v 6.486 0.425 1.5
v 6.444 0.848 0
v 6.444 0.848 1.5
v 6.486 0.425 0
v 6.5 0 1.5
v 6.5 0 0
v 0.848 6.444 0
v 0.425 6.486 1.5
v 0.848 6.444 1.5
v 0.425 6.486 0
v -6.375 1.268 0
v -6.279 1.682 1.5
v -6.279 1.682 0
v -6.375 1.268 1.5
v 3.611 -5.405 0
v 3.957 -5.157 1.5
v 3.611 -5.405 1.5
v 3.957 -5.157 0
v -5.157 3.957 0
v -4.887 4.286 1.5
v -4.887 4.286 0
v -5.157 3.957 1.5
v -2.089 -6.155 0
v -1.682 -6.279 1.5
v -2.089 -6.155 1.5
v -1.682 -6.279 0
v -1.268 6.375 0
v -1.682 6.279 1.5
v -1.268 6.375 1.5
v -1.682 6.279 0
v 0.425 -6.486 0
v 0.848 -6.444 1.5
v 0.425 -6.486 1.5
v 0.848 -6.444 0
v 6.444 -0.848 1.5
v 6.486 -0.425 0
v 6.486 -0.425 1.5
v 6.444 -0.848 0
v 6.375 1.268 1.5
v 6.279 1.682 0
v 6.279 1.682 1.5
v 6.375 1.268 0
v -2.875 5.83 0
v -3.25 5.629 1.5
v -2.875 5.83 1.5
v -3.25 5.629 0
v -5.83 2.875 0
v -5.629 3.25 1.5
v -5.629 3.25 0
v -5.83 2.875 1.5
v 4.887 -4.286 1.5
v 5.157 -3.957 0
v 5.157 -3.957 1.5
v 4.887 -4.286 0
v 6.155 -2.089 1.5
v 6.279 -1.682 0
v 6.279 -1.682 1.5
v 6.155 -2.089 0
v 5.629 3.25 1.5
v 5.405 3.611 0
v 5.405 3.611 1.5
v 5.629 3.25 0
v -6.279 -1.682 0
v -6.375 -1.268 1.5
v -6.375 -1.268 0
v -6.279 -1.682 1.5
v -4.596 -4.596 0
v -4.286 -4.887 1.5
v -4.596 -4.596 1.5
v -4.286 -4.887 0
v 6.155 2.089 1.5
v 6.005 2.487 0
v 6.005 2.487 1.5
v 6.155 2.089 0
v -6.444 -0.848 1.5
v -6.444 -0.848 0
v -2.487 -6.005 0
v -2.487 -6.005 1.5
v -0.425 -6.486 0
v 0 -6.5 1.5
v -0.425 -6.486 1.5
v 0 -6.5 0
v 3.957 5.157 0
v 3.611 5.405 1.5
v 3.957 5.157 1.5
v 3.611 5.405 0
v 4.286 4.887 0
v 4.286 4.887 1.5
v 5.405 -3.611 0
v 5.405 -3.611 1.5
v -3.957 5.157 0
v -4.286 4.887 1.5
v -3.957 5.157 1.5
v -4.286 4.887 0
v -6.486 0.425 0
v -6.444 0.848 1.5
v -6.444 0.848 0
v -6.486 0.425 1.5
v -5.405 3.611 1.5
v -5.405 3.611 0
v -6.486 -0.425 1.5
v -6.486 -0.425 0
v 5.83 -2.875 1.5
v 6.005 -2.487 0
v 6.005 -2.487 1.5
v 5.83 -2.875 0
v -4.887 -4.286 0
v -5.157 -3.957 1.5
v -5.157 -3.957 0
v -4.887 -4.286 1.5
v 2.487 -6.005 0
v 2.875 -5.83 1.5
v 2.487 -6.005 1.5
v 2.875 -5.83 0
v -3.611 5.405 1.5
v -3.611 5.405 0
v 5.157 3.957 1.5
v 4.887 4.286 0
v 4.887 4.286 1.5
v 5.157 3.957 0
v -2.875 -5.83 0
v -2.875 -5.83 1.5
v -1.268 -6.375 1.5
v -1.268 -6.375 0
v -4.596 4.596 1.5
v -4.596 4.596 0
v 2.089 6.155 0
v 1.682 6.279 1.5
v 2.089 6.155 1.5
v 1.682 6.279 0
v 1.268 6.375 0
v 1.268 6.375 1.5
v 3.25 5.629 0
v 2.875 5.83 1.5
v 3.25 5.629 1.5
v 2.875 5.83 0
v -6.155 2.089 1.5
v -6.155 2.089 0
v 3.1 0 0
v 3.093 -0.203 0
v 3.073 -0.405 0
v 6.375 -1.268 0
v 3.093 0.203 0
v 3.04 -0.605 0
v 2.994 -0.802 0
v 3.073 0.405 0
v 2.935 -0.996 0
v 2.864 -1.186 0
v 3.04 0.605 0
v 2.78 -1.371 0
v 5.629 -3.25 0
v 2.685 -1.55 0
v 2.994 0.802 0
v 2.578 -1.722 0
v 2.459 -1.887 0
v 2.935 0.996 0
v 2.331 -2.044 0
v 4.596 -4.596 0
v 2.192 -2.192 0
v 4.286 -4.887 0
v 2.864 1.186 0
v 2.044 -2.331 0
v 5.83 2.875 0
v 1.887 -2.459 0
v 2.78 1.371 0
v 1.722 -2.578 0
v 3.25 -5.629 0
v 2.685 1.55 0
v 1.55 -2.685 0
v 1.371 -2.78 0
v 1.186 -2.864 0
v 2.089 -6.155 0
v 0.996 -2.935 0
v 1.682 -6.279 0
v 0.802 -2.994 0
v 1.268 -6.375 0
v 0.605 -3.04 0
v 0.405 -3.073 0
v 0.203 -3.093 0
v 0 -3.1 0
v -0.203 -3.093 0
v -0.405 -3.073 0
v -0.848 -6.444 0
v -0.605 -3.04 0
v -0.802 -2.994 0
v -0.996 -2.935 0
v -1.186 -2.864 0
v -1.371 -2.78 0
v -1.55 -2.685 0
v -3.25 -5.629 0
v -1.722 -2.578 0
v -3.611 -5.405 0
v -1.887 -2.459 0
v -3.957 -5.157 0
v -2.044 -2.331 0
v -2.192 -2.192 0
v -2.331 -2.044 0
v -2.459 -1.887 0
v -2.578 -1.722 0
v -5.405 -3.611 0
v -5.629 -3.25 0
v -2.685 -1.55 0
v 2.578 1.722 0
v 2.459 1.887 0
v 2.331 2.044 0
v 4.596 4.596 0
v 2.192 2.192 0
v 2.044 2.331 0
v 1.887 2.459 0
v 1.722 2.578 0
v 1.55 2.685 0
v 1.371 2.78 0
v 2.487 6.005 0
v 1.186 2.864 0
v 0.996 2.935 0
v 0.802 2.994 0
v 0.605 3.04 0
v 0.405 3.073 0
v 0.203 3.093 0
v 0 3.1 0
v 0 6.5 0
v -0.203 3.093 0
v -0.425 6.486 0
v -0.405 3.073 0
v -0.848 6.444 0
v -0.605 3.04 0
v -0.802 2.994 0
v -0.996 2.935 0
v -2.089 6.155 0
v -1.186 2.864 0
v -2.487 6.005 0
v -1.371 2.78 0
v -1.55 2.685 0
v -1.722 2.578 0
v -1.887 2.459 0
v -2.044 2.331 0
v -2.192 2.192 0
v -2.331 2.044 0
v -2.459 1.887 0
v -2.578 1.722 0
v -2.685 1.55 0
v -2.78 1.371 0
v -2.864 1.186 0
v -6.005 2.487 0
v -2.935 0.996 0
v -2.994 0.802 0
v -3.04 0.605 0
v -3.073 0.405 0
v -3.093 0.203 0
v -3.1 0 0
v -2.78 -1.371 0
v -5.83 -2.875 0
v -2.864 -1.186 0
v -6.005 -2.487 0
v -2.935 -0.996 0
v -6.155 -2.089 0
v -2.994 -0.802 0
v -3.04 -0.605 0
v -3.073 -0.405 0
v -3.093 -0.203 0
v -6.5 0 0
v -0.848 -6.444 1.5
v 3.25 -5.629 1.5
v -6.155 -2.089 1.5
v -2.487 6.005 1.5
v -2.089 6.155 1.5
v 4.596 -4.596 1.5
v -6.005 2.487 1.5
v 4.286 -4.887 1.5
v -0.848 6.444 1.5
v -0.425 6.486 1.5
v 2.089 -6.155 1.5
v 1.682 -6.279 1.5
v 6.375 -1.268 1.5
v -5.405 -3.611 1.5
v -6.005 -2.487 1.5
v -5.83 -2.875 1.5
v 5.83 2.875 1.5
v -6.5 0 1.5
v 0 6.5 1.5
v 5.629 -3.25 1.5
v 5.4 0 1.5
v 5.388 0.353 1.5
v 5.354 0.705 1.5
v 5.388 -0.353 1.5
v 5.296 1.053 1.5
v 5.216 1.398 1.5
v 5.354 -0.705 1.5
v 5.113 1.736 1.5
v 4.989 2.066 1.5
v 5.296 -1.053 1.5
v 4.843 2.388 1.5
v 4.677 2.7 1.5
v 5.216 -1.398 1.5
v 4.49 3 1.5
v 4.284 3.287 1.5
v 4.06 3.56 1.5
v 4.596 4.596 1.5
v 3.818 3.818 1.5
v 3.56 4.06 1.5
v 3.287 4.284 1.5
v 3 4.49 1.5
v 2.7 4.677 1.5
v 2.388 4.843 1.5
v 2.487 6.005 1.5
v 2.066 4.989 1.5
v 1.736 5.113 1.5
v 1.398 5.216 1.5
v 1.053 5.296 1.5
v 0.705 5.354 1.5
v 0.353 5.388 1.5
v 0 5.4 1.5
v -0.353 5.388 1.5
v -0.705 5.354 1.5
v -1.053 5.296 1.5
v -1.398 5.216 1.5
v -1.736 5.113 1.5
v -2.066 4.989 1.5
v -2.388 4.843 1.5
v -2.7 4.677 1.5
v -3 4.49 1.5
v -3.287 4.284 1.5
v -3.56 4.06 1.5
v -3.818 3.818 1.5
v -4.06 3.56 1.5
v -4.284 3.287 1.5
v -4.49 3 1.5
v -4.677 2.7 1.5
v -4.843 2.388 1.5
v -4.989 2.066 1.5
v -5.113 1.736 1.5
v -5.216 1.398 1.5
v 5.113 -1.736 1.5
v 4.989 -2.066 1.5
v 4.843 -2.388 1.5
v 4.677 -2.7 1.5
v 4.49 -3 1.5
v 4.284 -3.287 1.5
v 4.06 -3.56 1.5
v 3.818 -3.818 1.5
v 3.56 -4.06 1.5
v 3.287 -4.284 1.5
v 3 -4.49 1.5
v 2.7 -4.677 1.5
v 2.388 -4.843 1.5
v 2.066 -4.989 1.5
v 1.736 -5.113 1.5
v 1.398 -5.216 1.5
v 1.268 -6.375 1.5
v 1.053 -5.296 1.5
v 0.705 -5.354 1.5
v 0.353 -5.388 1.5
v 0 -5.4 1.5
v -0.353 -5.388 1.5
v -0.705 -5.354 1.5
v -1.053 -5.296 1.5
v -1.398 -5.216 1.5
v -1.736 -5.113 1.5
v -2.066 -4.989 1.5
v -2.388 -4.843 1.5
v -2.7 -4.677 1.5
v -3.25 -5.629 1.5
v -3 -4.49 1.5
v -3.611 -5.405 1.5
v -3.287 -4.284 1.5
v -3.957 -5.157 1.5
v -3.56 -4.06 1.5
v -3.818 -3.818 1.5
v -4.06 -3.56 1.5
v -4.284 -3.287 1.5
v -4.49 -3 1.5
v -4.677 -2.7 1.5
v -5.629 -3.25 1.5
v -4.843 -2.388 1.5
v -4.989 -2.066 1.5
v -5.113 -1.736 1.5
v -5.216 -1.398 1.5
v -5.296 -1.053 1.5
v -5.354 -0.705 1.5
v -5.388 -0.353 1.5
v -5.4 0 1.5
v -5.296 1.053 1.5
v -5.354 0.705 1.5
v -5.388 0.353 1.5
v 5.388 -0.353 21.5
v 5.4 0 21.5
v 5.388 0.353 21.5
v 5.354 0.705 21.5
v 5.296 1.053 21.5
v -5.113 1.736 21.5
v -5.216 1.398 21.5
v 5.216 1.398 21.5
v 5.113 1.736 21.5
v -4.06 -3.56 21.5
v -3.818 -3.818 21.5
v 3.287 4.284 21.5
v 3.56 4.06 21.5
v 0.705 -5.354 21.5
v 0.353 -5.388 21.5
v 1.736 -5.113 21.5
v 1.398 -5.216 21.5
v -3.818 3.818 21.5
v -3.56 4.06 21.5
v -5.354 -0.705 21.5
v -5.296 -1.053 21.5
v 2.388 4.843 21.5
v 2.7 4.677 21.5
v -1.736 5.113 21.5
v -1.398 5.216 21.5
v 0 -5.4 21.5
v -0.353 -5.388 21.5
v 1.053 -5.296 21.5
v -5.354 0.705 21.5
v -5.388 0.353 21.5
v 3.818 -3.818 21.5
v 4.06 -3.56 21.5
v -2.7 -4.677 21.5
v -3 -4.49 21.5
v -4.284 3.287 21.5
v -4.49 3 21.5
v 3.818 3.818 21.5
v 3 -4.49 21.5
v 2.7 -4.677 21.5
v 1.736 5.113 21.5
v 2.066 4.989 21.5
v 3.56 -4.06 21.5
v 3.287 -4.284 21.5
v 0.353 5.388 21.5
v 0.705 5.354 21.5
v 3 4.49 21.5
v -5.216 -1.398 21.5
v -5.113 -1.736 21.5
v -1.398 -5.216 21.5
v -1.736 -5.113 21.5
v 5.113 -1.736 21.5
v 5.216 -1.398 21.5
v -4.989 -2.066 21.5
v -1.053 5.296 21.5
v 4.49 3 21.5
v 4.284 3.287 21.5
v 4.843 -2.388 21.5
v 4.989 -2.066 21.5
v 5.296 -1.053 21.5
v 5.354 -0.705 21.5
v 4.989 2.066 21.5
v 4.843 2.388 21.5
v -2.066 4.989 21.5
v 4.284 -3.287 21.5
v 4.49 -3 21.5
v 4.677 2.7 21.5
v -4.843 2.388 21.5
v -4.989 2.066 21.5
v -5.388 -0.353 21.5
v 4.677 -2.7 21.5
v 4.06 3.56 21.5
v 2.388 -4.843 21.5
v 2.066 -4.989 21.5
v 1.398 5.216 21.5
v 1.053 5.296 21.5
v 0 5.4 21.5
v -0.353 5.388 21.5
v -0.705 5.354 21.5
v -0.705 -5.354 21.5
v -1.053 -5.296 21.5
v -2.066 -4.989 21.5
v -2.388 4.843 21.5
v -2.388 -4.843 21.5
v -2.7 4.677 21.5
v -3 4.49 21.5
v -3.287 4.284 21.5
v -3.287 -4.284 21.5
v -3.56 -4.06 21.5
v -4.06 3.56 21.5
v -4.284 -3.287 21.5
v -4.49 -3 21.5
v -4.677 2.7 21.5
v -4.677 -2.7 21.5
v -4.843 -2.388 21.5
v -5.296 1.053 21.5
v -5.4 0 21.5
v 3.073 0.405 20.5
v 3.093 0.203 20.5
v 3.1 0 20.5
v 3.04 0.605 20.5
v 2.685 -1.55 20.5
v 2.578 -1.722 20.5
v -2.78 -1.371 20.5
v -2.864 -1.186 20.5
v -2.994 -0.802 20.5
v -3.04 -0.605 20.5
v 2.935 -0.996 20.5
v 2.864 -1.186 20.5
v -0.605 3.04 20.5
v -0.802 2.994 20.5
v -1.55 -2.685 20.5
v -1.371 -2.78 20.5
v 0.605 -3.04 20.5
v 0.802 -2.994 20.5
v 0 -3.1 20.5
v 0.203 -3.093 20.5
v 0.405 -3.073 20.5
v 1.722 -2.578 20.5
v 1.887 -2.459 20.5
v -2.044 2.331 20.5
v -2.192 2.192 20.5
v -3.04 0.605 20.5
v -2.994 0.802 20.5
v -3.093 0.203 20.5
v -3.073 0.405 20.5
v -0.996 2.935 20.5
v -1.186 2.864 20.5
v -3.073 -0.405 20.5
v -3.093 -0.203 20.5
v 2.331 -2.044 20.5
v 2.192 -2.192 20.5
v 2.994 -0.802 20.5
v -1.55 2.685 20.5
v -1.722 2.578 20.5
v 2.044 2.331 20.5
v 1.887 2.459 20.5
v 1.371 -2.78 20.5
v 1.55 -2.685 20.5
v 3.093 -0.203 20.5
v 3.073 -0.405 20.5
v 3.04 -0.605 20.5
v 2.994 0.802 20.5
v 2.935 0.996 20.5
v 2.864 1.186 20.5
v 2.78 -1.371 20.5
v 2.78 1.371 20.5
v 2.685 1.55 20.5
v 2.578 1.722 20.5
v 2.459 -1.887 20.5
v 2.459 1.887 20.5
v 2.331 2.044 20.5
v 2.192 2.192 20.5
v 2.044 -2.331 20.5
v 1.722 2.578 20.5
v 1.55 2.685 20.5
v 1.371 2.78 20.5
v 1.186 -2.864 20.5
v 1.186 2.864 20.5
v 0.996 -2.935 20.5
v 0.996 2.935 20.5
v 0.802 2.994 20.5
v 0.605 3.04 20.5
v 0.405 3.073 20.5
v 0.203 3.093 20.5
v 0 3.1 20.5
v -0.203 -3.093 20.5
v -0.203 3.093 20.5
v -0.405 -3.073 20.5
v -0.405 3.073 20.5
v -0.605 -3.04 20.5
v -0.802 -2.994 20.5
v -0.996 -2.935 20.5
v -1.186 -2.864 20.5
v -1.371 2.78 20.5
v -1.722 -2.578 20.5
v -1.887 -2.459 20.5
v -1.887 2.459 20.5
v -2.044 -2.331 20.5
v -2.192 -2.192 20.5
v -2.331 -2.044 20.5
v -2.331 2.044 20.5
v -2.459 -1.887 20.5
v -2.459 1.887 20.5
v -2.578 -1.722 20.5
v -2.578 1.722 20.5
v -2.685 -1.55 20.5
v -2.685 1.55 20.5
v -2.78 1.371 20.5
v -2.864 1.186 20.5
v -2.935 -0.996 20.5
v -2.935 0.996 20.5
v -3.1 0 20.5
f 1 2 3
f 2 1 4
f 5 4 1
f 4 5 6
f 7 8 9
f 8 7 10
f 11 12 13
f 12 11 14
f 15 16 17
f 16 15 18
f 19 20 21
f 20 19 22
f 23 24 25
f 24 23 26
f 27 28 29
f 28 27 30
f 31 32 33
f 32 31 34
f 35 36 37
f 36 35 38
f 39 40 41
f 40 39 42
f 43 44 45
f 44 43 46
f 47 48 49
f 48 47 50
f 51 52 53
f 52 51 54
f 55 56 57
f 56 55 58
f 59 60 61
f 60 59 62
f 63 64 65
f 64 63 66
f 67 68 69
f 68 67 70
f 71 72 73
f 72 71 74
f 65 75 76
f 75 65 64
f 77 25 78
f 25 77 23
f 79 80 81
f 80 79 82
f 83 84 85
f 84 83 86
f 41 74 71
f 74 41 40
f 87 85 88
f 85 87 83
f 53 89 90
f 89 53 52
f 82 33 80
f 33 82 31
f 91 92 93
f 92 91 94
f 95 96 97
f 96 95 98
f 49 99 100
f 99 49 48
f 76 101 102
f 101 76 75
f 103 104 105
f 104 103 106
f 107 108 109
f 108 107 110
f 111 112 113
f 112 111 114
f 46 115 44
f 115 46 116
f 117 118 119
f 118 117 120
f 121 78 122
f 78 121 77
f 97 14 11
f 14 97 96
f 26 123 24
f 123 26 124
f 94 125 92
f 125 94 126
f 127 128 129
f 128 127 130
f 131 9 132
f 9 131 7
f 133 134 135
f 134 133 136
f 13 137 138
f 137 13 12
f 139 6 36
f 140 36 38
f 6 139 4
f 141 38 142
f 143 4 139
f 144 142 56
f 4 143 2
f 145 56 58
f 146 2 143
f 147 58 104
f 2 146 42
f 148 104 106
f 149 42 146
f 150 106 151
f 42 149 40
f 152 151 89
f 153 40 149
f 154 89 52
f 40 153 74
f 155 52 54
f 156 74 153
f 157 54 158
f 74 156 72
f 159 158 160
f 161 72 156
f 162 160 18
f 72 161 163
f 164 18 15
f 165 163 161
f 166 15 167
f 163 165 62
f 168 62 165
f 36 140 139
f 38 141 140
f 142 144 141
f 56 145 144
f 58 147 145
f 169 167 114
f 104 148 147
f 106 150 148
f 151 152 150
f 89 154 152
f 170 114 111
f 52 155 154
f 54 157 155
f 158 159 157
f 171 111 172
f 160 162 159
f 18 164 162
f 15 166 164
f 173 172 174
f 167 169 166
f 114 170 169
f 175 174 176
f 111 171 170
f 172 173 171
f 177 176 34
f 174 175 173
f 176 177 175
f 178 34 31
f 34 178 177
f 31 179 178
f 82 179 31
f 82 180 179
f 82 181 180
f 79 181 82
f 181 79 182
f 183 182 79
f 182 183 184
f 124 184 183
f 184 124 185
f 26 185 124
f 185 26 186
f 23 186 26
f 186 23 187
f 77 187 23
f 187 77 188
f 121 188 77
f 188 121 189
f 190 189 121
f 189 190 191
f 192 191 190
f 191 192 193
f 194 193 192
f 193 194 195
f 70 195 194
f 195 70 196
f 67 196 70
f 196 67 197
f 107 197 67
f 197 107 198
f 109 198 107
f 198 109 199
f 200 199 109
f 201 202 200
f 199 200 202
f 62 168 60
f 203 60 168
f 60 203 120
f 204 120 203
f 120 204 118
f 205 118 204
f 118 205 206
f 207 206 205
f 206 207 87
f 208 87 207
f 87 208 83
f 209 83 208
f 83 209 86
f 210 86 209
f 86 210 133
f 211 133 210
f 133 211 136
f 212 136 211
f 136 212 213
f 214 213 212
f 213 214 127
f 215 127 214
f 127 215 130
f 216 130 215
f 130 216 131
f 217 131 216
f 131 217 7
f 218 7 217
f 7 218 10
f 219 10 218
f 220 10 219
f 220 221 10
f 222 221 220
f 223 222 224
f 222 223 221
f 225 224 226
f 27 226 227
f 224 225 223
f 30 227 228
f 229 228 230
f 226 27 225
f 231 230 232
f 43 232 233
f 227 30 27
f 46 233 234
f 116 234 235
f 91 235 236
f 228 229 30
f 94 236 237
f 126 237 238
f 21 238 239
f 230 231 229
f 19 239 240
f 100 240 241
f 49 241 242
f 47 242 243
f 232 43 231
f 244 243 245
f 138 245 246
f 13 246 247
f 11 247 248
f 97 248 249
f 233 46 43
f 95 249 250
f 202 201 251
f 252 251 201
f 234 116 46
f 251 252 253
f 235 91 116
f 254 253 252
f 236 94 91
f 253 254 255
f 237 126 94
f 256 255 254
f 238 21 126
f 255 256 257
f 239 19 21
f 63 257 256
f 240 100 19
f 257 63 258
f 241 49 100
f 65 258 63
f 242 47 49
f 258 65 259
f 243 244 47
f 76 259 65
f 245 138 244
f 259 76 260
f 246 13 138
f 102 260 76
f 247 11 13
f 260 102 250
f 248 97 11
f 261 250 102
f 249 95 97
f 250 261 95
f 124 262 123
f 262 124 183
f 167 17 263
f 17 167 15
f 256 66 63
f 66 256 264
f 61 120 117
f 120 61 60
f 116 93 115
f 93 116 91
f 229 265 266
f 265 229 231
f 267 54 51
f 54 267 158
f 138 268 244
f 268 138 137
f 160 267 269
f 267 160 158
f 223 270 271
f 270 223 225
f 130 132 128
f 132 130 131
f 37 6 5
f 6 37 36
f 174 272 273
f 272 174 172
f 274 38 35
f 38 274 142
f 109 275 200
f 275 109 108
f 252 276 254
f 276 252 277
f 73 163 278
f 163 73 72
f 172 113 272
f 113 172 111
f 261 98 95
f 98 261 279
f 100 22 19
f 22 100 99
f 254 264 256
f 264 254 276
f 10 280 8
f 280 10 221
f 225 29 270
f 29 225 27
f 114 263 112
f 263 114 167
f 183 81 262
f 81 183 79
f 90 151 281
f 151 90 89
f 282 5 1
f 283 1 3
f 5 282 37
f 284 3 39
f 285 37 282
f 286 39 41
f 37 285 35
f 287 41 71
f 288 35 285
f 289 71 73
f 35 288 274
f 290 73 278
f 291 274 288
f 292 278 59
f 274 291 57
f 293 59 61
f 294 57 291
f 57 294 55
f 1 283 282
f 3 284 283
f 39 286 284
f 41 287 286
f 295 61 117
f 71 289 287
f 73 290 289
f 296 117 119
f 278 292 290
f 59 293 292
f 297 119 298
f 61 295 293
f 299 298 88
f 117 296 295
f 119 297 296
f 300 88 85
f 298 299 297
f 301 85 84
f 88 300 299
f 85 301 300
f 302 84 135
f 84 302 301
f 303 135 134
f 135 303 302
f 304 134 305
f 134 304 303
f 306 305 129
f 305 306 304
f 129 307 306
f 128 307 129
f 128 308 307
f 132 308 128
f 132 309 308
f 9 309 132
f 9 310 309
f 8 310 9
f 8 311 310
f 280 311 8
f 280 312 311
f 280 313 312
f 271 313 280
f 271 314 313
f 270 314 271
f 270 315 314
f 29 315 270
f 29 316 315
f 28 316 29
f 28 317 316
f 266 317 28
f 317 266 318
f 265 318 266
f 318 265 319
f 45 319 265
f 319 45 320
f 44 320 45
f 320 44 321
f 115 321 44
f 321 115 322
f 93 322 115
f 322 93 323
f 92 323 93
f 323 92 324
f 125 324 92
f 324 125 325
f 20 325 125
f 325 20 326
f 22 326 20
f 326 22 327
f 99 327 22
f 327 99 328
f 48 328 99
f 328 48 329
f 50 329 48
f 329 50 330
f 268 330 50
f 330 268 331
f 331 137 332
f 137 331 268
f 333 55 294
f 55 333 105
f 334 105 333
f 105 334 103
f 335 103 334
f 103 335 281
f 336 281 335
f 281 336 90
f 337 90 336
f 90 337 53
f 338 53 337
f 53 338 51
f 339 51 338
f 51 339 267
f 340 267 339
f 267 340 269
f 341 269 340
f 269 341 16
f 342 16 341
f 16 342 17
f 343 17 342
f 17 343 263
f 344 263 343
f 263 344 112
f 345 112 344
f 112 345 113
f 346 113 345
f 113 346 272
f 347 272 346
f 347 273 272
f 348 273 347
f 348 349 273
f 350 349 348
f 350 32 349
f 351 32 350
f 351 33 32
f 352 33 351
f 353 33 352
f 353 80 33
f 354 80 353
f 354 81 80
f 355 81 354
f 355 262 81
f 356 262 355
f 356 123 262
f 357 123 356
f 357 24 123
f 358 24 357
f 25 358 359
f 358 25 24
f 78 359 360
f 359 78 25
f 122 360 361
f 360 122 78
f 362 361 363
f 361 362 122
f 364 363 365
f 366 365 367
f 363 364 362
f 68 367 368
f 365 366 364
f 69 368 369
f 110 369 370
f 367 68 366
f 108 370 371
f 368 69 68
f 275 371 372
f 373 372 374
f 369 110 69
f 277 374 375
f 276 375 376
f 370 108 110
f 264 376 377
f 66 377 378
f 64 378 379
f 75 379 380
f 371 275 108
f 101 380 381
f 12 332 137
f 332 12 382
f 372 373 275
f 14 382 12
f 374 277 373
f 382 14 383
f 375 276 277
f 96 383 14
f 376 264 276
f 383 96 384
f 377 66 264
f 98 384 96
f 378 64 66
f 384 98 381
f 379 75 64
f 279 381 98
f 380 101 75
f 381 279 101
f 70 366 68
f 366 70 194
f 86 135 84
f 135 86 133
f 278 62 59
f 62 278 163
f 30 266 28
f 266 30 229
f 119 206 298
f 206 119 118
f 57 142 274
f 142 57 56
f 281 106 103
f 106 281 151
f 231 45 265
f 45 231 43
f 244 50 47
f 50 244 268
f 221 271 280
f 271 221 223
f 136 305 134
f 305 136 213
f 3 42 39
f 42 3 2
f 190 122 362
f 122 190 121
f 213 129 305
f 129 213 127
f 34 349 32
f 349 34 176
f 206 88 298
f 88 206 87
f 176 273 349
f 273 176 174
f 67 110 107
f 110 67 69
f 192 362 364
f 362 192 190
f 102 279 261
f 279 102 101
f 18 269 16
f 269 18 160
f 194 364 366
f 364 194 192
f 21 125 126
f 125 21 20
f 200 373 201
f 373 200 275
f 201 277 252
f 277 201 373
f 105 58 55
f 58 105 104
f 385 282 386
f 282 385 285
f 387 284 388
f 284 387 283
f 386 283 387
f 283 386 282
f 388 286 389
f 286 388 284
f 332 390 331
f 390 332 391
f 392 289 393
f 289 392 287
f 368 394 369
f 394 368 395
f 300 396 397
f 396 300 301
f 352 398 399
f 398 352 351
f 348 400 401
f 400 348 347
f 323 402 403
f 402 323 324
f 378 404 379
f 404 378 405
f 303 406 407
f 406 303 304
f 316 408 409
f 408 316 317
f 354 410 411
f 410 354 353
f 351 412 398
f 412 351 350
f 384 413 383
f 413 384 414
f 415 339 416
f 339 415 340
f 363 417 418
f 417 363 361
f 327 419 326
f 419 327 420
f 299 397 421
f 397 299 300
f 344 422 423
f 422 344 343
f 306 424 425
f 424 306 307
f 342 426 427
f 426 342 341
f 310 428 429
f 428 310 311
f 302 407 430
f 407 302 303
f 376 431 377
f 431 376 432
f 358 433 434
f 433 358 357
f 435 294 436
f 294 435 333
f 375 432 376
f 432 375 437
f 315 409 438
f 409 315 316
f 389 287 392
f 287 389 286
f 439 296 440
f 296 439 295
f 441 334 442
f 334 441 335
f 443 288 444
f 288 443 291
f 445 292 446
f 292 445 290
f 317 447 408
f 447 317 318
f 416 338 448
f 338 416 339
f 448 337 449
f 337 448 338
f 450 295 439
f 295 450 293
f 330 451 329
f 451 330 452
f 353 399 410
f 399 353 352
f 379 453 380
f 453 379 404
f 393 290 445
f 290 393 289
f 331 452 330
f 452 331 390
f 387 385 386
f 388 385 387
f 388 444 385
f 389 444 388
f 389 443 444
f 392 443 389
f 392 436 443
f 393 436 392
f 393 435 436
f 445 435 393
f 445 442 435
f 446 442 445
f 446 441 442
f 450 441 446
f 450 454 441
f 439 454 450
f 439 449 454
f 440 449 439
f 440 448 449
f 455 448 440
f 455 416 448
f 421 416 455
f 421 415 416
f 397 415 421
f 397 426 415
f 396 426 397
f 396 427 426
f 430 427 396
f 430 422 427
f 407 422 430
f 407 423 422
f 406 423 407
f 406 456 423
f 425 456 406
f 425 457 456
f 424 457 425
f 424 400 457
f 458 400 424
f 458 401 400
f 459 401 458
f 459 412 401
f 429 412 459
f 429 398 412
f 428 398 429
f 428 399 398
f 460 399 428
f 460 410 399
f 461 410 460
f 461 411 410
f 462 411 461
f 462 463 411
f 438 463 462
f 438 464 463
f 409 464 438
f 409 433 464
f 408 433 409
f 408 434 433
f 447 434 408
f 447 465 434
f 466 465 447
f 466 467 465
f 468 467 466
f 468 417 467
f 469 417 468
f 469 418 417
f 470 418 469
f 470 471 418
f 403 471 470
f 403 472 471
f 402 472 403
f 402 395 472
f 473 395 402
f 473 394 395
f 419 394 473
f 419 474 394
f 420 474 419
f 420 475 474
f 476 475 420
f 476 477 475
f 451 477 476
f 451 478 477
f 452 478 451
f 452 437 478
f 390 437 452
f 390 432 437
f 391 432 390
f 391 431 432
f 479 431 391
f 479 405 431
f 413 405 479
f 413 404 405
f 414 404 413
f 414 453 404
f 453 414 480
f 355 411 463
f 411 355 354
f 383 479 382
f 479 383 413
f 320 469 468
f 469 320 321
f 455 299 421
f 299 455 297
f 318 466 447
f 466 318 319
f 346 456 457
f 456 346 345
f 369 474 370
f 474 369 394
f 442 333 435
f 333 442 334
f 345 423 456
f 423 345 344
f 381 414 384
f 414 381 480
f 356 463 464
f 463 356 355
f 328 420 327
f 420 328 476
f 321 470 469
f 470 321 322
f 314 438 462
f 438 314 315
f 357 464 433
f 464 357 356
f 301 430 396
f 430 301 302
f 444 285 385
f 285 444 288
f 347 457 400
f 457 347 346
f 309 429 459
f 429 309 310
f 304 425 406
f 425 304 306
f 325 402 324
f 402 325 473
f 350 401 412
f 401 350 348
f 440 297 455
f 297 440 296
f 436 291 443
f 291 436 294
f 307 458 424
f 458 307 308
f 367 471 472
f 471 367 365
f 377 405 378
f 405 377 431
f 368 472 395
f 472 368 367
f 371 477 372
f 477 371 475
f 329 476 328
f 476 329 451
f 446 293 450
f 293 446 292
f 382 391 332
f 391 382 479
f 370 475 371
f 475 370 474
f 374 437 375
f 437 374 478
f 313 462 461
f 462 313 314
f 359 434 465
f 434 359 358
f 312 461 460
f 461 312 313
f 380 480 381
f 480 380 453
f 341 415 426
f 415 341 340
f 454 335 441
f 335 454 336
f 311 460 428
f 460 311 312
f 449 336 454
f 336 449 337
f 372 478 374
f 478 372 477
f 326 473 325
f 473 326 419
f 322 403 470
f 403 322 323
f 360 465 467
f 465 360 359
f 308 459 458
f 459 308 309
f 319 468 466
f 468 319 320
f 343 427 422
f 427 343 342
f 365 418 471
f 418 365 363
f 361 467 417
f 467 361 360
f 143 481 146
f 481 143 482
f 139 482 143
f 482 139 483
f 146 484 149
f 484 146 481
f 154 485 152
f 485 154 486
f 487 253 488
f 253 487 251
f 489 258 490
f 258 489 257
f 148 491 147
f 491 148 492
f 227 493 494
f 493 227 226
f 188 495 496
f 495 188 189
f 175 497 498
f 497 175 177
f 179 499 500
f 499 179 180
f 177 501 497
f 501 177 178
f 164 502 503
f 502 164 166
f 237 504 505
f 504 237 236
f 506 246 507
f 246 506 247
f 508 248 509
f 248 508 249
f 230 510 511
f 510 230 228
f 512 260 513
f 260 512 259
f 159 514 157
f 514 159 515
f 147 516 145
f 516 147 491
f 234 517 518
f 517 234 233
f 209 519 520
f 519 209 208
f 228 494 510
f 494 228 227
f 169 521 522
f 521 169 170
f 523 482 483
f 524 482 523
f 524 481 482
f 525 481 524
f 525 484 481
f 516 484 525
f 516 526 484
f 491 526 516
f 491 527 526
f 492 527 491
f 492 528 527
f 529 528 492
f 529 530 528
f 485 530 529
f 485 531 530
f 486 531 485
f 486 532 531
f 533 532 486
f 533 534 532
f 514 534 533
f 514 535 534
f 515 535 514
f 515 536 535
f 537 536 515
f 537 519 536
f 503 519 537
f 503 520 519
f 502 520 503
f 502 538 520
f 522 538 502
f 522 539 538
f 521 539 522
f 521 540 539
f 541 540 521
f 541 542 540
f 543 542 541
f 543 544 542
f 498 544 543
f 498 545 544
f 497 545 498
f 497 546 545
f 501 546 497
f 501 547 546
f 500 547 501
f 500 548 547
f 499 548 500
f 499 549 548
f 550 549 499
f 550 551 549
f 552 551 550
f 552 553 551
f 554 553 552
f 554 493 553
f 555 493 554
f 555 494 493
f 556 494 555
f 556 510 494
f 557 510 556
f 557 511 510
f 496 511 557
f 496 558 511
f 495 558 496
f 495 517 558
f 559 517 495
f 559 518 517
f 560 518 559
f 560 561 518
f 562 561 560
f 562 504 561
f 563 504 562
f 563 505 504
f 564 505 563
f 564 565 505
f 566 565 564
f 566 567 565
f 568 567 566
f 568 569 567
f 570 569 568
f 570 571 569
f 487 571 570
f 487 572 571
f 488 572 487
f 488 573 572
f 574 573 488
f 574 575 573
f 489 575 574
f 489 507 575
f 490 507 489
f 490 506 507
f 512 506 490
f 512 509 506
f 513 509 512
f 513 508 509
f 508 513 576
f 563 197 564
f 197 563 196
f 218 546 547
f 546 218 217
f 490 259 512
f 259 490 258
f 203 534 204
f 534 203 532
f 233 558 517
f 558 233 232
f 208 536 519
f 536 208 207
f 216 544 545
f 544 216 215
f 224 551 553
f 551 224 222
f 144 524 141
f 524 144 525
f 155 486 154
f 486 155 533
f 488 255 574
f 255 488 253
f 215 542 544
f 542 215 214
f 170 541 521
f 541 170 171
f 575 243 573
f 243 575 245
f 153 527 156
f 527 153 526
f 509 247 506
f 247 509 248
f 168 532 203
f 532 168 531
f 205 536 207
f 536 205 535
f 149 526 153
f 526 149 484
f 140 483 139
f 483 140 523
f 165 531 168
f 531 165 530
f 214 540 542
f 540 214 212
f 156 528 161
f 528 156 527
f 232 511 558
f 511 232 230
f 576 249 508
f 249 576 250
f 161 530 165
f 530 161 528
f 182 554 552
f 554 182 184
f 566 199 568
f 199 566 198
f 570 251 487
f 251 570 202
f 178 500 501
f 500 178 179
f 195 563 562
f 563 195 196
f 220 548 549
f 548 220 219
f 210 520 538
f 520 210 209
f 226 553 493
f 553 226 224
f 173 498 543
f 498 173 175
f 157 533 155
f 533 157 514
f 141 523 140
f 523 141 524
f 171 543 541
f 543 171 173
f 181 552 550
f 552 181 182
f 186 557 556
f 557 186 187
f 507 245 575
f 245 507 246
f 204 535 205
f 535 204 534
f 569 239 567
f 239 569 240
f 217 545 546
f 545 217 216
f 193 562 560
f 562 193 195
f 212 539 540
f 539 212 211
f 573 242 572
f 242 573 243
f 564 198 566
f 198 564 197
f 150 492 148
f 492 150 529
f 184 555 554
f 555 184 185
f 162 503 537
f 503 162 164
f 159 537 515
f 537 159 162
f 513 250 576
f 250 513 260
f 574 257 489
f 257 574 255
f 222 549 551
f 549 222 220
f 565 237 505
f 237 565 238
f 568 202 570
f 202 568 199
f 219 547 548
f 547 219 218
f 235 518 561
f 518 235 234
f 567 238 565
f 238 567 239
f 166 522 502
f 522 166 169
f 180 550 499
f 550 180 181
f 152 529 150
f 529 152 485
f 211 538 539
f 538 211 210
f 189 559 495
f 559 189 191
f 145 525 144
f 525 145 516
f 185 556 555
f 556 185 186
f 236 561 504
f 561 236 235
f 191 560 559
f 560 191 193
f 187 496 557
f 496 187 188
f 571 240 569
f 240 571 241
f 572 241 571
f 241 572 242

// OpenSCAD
// PCR tube adapter sleeve: fits a 0.2 mL tube in a 1.5 mL rack hole
// Print orientation: collar on the bed (z = 0), sleeve body builds up to z = 21.5

// ---------------- Parameters ----------------
collar_d      = 13;     // collar outer diameter (on the bed)
collar_t      = 1.5;    // collar thickness (z = 0 to 1.5)
sleeve_d      = 10.8;   // sleeve body outer diameter
sleeve_h      = 20;     // sleeve body height above the collar (z = 1.5 to 21.5)
bore_d        = 6.2;    // through-bore diameter (open at both ends)
eps           = 0.5;    // cutter overshoot past faces
$fn           = 96;     // curve resolution

// Derived
sleeve_top_z  = collar_t + sleeve_h;   // 21.5 mm

// ---------------- Model ----------------
difference() {
    union() {
        // Collar lying on the bed
        cylinder(d = collar_d, h = collar_t);

        // Sleeve body rising from the collar
        translate([0, 0, collar_t])
            cylinder(d = sleeve_d, h = sleeve_h);
    }

    // Straight through-bore
    translate([0, 0, -eps])
        cylinder(d = bore_d, h = sleeve_h + 2 * eps);
}
